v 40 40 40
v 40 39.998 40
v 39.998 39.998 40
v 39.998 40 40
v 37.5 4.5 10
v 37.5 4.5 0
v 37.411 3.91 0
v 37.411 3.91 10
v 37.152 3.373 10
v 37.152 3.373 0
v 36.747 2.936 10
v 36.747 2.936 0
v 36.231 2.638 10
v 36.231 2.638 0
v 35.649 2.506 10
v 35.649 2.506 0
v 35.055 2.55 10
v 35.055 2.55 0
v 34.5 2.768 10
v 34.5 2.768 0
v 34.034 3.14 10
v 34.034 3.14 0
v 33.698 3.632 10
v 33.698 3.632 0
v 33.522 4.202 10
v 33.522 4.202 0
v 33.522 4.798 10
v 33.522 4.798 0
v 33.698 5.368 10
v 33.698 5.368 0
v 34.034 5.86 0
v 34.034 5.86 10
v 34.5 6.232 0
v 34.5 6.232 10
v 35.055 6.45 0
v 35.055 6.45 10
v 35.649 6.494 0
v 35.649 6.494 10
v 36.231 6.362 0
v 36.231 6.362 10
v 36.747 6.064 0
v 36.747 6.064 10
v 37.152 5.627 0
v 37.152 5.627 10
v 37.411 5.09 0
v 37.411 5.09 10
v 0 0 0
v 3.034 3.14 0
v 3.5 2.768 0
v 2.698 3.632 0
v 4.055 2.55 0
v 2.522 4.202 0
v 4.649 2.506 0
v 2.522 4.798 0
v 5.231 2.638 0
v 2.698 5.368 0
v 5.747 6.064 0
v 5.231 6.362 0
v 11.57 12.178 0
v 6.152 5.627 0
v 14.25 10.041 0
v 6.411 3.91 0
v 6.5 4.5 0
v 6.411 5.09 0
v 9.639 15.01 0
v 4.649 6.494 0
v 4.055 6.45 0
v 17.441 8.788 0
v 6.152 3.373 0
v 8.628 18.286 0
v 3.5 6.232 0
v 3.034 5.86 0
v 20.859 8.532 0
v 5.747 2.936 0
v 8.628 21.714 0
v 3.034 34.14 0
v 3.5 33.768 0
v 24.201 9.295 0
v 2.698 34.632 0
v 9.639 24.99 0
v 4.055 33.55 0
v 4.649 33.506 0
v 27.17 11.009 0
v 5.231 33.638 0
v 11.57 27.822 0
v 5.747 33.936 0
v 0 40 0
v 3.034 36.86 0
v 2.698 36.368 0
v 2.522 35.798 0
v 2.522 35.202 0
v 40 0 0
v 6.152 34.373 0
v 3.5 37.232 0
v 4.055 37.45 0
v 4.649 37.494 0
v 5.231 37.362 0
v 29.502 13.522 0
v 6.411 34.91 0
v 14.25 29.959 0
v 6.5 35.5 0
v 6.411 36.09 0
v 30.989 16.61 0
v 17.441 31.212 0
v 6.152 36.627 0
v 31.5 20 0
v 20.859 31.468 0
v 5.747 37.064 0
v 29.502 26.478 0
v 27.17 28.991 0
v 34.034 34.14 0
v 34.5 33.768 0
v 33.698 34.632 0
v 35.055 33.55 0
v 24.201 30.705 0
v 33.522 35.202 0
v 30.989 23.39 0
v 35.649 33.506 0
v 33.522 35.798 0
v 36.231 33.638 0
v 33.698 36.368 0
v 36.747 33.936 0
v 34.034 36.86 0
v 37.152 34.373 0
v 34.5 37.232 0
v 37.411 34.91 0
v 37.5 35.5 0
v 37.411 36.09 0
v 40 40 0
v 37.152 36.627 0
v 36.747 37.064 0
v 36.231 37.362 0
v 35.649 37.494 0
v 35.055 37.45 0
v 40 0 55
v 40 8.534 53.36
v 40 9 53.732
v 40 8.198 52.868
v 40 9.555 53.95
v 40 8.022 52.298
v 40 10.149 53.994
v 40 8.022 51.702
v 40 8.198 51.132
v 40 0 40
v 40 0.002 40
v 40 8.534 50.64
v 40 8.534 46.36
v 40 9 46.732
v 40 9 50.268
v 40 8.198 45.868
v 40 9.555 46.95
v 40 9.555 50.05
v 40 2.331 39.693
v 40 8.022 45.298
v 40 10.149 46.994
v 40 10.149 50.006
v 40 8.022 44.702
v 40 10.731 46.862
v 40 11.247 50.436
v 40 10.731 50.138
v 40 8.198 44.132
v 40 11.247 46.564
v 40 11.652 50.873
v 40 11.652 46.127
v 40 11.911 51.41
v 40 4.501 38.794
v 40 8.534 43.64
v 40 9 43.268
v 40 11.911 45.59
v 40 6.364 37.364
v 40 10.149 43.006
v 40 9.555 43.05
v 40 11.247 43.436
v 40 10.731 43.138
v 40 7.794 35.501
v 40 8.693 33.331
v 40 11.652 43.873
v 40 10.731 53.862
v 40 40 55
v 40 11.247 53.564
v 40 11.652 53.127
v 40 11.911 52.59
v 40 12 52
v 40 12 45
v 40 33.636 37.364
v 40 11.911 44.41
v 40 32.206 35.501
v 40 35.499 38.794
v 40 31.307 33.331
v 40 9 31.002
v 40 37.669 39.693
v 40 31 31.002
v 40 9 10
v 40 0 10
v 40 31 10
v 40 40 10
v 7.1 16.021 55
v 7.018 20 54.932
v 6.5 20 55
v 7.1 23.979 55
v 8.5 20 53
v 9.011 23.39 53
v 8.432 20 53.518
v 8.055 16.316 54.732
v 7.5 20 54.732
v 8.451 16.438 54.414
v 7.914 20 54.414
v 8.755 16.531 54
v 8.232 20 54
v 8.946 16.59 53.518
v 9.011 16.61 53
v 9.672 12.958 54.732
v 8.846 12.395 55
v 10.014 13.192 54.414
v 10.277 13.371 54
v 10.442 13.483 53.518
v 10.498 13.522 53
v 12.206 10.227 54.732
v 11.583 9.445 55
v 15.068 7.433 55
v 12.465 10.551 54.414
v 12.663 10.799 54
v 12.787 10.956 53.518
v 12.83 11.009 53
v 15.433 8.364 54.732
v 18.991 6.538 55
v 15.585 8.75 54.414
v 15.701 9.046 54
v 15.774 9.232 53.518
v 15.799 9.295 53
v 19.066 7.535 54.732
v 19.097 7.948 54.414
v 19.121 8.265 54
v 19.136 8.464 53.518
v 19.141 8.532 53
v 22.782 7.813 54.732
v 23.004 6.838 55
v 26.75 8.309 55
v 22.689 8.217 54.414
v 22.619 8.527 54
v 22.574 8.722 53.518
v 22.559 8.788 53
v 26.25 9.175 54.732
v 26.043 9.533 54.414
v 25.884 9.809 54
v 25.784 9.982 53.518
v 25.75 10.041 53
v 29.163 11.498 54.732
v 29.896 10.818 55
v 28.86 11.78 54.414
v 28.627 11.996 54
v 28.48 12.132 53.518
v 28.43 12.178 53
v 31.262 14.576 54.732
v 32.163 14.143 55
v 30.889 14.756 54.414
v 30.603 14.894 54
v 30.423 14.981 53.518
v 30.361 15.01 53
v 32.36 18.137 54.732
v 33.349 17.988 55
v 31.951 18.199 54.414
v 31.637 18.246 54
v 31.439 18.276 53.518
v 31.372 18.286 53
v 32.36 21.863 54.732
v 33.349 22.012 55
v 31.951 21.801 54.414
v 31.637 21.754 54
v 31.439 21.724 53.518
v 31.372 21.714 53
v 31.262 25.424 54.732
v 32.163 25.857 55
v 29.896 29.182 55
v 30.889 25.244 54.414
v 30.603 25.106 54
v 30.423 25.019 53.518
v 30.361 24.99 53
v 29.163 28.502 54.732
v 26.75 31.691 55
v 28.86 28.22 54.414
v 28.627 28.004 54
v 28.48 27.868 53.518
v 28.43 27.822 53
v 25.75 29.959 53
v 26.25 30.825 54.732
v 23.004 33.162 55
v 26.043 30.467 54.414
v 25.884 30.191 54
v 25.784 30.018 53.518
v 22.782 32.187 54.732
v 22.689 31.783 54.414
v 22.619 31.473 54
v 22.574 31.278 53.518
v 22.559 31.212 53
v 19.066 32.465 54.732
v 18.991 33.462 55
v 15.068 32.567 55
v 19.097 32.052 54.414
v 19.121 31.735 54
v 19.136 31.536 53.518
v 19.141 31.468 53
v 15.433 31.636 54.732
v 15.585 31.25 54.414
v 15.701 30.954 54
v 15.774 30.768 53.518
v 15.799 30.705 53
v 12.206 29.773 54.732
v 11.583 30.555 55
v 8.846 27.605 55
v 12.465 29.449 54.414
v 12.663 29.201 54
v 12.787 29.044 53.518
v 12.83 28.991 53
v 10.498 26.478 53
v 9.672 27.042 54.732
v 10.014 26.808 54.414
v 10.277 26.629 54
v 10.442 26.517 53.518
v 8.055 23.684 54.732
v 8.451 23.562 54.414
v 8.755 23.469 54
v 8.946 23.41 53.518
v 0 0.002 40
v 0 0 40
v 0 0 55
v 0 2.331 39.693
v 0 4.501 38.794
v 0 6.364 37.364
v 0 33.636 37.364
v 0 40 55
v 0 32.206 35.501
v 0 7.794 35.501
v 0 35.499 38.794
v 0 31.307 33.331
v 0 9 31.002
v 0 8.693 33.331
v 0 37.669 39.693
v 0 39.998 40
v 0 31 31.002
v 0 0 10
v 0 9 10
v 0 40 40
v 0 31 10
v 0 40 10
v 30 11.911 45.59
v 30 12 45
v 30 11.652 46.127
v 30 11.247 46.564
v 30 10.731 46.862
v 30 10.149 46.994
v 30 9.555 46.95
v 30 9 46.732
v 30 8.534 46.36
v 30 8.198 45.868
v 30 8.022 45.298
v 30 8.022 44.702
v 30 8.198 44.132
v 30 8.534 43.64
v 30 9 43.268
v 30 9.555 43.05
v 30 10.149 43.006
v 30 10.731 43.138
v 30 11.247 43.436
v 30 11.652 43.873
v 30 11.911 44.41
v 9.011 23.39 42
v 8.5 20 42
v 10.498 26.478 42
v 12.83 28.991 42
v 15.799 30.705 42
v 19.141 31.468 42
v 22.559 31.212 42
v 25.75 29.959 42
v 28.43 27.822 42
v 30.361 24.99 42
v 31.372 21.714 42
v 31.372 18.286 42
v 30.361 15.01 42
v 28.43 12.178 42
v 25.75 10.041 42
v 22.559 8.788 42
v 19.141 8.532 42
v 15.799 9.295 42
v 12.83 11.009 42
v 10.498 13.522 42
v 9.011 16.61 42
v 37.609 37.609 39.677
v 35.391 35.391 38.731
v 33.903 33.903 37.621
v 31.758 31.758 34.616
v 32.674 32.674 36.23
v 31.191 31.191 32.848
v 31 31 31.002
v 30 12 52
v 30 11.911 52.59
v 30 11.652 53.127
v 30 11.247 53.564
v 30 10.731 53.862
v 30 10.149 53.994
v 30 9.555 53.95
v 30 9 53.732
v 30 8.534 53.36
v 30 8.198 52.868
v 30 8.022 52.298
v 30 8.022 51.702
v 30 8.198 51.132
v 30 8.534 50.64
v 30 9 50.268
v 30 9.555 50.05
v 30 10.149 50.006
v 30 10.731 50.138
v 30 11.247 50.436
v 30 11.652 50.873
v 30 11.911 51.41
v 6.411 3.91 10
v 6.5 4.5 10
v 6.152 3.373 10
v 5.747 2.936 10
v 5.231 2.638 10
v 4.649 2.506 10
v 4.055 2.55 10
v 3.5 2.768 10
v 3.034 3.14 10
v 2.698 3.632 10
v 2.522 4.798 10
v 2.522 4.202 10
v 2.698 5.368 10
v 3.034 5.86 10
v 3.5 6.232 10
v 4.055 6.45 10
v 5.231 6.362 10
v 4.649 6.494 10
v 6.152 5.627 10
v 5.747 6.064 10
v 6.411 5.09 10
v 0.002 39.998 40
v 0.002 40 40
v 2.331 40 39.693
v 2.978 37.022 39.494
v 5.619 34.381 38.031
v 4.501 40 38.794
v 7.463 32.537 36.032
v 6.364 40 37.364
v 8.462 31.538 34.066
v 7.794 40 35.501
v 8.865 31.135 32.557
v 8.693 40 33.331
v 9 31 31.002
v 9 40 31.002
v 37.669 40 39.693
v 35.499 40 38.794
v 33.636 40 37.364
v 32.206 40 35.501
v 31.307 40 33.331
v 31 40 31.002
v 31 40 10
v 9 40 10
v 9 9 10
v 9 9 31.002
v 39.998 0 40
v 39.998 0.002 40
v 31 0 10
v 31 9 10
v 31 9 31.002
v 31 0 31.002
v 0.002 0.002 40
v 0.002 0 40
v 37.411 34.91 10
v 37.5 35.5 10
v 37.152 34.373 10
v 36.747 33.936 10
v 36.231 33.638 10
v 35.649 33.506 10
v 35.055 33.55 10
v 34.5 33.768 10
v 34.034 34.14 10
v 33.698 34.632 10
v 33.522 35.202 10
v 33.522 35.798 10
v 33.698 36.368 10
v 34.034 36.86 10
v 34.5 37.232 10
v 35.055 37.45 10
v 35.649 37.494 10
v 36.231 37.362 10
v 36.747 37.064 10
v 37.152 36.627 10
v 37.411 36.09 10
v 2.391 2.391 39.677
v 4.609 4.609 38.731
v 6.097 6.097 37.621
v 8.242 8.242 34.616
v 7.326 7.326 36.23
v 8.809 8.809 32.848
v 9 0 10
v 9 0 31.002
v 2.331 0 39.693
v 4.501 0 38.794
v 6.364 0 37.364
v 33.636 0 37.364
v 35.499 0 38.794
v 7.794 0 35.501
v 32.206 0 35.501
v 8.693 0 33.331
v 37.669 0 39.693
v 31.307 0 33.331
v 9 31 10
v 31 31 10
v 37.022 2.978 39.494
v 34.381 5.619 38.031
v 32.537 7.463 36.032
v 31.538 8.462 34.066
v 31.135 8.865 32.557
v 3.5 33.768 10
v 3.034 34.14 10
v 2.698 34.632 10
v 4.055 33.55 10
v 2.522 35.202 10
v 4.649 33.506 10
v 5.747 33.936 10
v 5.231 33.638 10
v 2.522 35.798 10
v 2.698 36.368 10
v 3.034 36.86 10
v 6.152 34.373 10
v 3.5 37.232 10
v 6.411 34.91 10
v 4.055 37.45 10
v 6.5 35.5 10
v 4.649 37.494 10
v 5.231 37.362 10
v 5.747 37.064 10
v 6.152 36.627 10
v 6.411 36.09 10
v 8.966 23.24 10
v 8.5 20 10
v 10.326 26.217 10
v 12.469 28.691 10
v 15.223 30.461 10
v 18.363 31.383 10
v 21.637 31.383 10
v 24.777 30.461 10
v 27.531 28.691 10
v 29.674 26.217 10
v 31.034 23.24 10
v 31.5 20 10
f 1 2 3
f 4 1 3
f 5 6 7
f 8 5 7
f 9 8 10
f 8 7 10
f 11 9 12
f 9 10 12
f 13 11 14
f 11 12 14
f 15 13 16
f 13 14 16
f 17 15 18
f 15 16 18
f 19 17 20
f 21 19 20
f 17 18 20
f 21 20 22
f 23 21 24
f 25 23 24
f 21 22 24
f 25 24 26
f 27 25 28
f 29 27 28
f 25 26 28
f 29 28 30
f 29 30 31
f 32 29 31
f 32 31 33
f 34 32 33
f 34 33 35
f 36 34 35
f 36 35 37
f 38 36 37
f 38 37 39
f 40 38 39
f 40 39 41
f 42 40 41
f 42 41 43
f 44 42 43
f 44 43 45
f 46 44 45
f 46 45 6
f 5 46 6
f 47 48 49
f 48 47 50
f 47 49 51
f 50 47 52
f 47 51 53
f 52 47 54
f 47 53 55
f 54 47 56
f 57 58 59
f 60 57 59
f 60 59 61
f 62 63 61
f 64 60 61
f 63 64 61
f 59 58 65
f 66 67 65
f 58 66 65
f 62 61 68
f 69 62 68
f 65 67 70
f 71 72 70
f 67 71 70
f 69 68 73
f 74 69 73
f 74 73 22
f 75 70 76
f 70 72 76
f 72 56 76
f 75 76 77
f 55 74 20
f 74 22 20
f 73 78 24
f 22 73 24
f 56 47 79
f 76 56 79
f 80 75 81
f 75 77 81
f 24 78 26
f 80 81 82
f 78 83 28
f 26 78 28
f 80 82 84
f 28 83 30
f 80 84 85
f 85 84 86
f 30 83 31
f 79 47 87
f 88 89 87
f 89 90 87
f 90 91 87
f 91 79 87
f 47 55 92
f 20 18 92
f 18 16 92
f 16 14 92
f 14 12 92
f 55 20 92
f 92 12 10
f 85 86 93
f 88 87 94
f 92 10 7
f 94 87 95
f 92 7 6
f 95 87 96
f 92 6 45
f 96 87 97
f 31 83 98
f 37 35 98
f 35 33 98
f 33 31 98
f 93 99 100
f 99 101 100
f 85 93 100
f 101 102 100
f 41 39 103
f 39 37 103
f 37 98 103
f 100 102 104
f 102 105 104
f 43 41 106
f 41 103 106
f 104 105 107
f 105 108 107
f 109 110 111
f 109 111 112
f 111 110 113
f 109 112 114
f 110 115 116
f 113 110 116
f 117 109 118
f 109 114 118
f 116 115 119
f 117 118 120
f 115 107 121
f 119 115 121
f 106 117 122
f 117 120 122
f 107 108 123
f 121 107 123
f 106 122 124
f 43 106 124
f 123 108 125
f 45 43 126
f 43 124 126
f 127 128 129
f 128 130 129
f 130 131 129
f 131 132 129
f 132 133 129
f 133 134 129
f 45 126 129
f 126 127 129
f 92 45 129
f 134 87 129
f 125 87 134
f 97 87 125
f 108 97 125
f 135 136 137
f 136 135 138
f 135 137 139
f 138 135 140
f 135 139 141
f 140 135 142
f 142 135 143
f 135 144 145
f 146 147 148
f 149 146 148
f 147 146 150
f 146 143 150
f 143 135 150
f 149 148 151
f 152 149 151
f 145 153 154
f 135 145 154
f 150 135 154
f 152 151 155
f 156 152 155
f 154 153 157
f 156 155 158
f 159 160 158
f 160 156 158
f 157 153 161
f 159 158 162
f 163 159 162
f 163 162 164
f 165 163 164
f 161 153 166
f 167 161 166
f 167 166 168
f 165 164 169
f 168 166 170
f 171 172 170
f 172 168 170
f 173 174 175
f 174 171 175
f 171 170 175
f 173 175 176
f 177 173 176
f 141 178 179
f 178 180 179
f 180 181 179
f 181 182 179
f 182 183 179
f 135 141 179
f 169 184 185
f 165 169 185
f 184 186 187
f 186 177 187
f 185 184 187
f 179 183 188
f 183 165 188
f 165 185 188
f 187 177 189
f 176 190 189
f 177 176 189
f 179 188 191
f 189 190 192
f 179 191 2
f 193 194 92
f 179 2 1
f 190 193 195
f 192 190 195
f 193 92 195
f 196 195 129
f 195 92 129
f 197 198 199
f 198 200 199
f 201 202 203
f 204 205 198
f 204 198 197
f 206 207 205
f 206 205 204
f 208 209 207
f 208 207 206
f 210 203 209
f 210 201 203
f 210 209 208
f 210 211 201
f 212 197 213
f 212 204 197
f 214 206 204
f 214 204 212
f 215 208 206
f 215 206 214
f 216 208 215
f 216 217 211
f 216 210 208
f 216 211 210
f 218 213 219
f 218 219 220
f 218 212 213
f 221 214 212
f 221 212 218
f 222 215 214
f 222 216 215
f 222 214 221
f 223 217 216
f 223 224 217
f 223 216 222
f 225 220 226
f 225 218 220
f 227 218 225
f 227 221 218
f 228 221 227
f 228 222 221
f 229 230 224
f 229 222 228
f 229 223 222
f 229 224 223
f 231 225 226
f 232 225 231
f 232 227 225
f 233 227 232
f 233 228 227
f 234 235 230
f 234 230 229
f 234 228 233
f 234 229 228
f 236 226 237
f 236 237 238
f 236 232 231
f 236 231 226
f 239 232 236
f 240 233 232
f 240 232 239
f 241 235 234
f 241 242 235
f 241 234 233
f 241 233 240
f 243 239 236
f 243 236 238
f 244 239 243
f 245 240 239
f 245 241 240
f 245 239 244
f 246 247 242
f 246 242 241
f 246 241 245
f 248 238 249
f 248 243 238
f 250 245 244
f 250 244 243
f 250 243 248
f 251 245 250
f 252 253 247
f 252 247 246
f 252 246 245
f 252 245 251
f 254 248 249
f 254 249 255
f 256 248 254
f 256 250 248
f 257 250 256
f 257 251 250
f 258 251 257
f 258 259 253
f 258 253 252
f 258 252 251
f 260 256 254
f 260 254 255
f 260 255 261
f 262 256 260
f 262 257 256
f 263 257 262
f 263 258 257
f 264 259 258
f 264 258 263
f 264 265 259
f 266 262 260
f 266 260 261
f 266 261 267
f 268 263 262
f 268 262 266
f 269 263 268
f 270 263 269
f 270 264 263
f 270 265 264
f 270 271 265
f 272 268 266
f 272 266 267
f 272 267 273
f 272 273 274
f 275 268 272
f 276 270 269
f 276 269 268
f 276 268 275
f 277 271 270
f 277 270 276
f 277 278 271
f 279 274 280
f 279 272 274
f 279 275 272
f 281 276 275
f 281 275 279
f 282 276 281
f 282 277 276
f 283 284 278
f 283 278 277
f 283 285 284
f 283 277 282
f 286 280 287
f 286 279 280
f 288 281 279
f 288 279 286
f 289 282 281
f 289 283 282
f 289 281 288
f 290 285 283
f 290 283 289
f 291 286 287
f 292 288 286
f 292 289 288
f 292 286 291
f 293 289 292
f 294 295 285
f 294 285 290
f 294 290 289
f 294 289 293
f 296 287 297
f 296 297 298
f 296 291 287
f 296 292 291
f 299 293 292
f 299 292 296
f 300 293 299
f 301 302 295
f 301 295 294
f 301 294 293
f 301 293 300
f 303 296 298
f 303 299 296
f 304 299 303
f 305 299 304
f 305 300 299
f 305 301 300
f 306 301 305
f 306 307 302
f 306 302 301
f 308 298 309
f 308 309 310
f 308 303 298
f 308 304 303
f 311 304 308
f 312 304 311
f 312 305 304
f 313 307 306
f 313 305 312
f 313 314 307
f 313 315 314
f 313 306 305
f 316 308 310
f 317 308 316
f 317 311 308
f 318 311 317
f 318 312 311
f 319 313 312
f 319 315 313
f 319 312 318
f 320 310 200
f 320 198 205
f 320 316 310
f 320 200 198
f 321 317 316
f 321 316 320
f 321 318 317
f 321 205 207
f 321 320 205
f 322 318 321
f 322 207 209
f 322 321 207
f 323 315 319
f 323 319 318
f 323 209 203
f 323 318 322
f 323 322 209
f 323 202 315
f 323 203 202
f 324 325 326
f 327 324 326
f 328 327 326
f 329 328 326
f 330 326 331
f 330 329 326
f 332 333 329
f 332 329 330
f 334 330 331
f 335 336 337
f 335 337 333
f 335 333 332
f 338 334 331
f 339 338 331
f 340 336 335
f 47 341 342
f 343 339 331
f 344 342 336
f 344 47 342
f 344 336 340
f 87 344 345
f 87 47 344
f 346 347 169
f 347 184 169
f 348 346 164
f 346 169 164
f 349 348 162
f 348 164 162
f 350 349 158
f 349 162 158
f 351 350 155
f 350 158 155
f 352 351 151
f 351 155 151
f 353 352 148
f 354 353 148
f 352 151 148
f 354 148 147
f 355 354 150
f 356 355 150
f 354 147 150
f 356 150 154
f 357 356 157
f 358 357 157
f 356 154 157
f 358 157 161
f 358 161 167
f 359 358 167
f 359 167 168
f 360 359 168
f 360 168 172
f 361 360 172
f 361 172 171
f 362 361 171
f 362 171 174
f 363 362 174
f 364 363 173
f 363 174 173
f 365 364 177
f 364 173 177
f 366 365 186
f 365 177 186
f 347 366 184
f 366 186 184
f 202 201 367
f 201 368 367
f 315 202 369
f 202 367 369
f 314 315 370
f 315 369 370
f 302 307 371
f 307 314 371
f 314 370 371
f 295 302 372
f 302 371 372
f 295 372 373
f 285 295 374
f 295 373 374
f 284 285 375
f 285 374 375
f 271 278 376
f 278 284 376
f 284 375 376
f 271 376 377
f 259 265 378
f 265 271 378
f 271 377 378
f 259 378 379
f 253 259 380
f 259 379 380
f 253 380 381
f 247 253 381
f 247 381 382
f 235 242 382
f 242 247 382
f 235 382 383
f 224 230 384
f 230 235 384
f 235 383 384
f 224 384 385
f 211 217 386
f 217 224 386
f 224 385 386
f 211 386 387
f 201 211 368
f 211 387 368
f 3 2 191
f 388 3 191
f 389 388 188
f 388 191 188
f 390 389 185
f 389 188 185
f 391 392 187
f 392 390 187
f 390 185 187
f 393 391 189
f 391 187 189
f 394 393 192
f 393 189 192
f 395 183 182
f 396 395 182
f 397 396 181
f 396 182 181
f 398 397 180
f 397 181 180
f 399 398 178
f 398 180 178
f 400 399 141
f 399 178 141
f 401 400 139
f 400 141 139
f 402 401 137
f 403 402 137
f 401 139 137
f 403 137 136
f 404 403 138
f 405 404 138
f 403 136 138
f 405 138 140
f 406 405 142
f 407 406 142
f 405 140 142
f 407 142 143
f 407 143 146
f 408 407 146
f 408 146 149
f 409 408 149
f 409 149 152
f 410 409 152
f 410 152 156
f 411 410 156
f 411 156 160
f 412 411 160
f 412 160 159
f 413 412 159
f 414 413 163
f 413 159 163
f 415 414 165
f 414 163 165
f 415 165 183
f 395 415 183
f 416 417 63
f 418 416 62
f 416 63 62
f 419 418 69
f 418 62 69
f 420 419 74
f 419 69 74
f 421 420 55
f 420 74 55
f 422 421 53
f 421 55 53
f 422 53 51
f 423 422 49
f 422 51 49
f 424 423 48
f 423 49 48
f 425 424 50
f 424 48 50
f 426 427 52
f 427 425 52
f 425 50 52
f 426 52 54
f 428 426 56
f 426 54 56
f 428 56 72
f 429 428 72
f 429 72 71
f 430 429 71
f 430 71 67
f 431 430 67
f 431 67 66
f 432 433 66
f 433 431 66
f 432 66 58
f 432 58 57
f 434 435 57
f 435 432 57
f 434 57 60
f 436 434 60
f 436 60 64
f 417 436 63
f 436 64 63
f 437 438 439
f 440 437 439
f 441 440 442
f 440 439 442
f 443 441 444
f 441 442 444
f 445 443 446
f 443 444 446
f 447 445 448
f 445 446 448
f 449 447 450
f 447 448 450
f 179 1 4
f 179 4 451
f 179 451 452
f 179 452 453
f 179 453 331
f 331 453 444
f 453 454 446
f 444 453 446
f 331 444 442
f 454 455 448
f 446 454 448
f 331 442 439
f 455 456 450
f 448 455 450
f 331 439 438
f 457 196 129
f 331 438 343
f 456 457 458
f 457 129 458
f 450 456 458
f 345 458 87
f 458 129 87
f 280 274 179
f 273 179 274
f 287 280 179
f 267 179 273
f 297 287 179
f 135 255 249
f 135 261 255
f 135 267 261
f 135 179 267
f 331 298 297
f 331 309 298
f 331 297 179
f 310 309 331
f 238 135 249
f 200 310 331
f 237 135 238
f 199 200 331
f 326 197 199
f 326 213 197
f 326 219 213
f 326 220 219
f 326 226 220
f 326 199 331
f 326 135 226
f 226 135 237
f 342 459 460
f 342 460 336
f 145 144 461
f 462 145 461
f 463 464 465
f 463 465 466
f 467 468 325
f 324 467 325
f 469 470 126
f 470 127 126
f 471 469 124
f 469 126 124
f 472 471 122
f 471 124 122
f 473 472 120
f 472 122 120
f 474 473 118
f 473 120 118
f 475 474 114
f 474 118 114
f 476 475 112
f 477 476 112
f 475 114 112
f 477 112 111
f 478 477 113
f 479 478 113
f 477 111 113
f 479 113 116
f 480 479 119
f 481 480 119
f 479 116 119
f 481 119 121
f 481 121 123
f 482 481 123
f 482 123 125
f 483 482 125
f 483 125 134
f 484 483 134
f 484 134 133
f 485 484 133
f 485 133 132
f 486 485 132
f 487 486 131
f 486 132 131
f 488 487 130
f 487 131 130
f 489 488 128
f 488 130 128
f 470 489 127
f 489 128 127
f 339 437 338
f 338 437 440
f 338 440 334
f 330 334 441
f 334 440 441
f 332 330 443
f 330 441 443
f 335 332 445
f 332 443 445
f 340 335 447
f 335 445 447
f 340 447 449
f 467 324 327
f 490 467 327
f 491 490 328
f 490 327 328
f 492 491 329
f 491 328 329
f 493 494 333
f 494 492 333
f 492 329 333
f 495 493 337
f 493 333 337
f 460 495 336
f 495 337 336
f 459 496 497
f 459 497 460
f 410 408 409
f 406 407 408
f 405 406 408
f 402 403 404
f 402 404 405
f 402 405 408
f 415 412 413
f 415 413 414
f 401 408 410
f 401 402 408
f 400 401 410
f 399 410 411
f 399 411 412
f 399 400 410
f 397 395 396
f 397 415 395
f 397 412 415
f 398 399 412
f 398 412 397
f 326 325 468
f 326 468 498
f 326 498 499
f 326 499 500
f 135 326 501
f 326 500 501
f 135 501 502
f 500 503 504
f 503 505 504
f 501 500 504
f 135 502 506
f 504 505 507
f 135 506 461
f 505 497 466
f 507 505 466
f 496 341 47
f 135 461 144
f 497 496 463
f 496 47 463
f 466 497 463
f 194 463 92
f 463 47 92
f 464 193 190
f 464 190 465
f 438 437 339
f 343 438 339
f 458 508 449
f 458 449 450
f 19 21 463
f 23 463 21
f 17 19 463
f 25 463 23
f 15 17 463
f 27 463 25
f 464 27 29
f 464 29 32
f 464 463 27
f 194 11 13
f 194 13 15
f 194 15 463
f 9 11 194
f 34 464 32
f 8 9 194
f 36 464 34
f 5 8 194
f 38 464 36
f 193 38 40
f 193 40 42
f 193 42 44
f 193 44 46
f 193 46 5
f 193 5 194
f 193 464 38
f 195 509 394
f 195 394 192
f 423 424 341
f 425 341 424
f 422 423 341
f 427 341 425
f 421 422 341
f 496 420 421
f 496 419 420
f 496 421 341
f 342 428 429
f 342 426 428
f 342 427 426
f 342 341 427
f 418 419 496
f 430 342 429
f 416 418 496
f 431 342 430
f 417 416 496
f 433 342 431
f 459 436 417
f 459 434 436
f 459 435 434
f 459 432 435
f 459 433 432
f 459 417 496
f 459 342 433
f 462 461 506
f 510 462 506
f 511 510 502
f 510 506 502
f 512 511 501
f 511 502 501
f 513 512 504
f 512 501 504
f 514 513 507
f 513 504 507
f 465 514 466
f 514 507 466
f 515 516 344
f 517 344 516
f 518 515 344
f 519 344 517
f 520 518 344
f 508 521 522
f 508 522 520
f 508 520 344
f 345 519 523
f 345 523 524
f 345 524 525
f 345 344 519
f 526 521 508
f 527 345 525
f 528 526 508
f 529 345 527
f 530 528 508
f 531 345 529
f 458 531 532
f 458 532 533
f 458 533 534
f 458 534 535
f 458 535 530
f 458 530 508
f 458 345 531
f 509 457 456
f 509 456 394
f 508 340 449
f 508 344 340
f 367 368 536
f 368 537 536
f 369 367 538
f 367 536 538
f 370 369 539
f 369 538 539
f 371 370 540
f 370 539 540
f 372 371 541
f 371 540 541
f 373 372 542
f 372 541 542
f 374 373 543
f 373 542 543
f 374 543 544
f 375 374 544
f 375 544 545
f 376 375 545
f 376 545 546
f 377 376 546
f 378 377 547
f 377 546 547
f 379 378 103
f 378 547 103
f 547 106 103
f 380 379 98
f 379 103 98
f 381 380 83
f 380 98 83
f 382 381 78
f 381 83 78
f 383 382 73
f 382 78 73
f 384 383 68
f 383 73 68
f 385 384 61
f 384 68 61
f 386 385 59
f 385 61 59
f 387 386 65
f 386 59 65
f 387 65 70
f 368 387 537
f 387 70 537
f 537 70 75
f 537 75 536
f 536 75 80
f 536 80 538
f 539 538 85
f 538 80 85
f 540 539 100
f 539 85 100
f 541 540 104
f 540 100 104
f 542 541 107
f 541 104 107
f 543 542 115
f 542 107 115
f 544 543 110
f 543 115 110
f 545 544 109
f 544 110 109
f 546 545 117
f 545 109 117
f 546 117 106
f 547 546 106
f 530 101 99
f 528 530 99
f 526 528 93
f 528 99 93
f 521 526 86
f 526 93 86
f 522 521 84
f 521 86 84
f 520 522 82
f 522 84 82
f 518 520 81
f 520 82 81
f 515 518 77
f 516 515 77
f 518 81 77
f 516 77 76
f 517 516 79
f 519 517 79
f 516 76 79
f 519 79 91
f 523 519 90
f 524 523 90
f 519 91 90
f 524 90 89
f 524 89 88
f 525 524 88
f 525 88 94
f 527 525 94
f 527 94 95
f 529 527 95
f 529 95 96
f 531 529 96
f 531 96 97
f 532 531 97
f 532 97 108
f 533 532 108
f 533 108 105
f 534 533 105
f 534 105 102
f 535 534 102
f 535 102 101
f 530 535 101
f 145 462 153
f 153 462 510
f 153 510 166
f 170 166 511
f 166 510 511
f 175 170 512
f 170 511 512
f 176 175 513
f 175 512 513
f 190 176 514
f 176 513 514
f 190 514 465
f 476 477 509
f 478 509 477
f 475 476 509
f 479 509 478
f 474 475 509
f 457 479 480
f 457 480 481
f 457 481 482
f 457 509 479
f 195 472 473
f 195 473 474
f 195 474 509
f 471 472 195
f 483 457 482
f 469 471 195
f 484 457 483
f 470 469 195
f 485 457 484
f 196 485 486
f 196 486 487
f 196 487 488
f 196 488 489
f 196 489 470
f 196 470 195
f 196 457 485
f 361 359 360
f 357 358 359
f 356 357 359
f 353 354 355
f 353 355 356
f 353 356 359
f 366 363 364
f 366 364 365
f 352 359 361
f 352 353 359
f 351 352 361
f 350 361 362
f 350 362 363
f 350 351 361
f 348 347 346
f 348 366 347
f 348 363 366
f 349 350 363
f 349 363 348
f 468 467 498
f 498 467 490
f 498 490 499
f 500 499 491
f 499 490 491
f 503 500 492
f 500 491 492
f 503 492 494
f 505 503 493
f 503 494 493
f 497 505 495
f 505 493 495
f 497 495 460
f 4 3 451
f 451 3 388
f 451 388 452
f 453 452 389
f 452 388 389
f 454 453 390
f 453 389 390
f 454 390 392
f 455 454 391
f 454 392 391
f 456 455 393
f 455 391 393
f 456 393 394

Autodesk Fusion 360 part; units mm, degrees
sketch "Skizze1" plane through (0, 0, 0) normal (0, 0, 1) x (1, 0, 0)
  line L0 (4.5, 4.5) -> (35.5, 4.5)
  line L1 (35.5, 4.5) -> (35.5, 35.5)
  line L2 (35.5, 35.5) -> (4.5, 35.5)
  line L3 (4.5, 35.5) -> (4.5, 4.5)
  line L4 (4.5, 4.5) -> (35.5, 35.5) construction
  line L5 (35.5, 4.5) -> (4.5, 35.5) construction
  circle A0 centre (20, 20) radius 11.5
  circle A1 centre (4.5, 35.5) radius 2
  circle A2 centre (35.5, 35.5) radius 2
  circle A3 centre (4.5, 4.5) radius 2
  circle A4 centre (35.5, 4.5) radius 2
  line L6 (0, 40) -> (40, 40)
  line L7 (40, 40) -> (40, 0)
  line L8 (40, 0) -> (0, 0)
  line L9 (0, 0) -> (0, 40)
  line L10 (0, 40) -> (40, 0) construction
  line L11 (40, 40) -> (0, 0) construction
  point P0 (20, 20)
  point P1 (20, 20)
  dimension "d1" = 31
  dimension "d2" = 31
  dimension "d3" = 23
  dimension "d4" = 4
  dimension "d5" = 4
  dimension "d6" = 4
  dimension "d7" = 4
  dimension "d8" = 40
  dimension "d9" = 40
extrude "Extrusion1" add sketch "Skizze1" along normal blind 10 contours L0 L1 L2 L3 A1 A2 A3 A4 | L6 L7 L8 L9
sketch "Skizze2" plane through (0, 0, 10) normal (0, 0, 1) x (-1, 0, 0)
  circle A0 centre (-4.5, -4.5) radius 2
  circle A1 centre (-35.5, -35.5) radius 2
  circle A2 centre (-35.5, -4.5) radius 2
  circle A3 centre (-20, -20) radius 11.5
  circle A4 centre (-4.5, -35.5) radius 2
  line L0 (0, 0) -> (-40, 0)
  line L1 (-40, 0) -> (-40, -40)
  line L2 (-40, -40) -> (0, -40)
  line L3 (0, -40) -> (0, 0)
  line L4 (0, -31) -> (-40, -31)
  line L5 (-40, -31) -> (-40, -9)
  line L6 (-40, -9) -> (0, -9)
  line L7 (0, -9) -> (0, -31)
  line L8 (0, -31) -> (-40, -9) construction
  line L9 (-40, -31) -> (0, -9) construction
  line L10 (-9, -40) -> (-31, -40)
  line L11 (-31, -40) -> (-31, 0)
  line L12 (-31, 0) -> (-9, 0)
  line L13 (-9, 0) -> (-9, -40)
  line L14 (-9, -40) -> (-31, 0) construction
  line L15 (-31, -40) -> (-9, 0) construction
  point P0 (-20, -20)
  point P1 (-20, -20)
extrude "Extrusion2" add sketch "Skizze2" along normal blind 30 contours A3 L3 L4 L6 L7 L13 | A3 L6 L13 | A3 L4 L13 | A3 L0 L6 L11 L12 L13 | A3 L2 L4 L10 L11 L13 | A3 L6 L11 | A3 L4 L11 | A3 L1 L4 L5 L6 L11
sketch "Skizze3" plane through (0, 0, 40) normal (0, 0, 1) x (-1, 0, 0)
  circle A0 centre (-20, -20) radius 11.5
  line L0 (-9, 0) -> (-31, 0)
  line L1 (-31, 0) -> (-31, -9)
  line L2 (-31, -9) -> (-40, -9)
  line L3 (-40, -9) -> (-40, -31)
  line L4 (-40, -31) -> (-31, -31)
  line L5 (-31, -31) -> (-31, -40)
  line L6 (-31, -40) -> (-9, -40)
  line L7 (-9, -40) -> (-9, -31)
  line L8 (-9, -31) -> (0, -31)
  line L9 (0, -31) -> (0, -9)
  line L10 (0, -9) -> (-9, -9)
  line L11 (-9, -9) -> (-9, 0)
  line L12 (0, -40) -> (-40, -40)
  line L13 (-40, -40) -> (-40, 0)
  line L14 (-40, 0) -> (0, 0)
  line L15 (0, 0) -> (0, -40)
  line L16 (0, -40) -> (-40, 0) construction
  line L17 (-40, -40) -> (0, 0) construction
  point P0 (-20, -20)
extrude "Extrusion3" add sketch "Skizze3" along normal blind 2
extrude "Extrusion4" add 1 faces at (19.7135, 37.1559, 42) along direction (0, 0, 1) blind 13
sketch "Skizze4" plane through (40, 0, 0) normal (1, 0, 0) x (0, 1, 0)
  line L0 (0, 0) -> (40, 0)
  line L1 (40, 0) -> (40, 10)
  line L2 (40, 10) -> (31, 10)
  line L3 (31, 10) -> (31, 40)
  line L4 (31, 40) -> (40, 40)
  line L5 (40, 40) -> (40, 55)
  line L6 (40, 55) -> (0, 55)
  line L7 (0, 55) -> (0, 40)
  line L8 (0, 40) -> (9, 40)
  line L9 (9, 40) -> (9, 10)
  line L10 (9, 10) -> (0, 10)
  line L11 (0, 10) -> (0, 0)
  circle A0 centre (10, 52) radius 2
  circle A1 centre (10, 45) radius 2
  line L12 (10, 52) -> (10, 45)
  dimension "d18" = 4
  dimension "d19" = 4
  dimension "d26" = 7
extrude "Extrusion5" cut sketch "Skizze4" against normal blind 10 contours A0 | A1
fillet "Abrundung1" radius 9 8 edges at (31, 35.5, 40) (35.5, 31, 40) (31, 4.5, 40) (35.5, 9, 40) (4.5, 9, 40) (9, 4.5, 40) (9, 35.5, 40) (4.5, 31, 40)
fillet "Abrundung2" radius 2 1 edges at (30.7218, 15.8414, 55)
